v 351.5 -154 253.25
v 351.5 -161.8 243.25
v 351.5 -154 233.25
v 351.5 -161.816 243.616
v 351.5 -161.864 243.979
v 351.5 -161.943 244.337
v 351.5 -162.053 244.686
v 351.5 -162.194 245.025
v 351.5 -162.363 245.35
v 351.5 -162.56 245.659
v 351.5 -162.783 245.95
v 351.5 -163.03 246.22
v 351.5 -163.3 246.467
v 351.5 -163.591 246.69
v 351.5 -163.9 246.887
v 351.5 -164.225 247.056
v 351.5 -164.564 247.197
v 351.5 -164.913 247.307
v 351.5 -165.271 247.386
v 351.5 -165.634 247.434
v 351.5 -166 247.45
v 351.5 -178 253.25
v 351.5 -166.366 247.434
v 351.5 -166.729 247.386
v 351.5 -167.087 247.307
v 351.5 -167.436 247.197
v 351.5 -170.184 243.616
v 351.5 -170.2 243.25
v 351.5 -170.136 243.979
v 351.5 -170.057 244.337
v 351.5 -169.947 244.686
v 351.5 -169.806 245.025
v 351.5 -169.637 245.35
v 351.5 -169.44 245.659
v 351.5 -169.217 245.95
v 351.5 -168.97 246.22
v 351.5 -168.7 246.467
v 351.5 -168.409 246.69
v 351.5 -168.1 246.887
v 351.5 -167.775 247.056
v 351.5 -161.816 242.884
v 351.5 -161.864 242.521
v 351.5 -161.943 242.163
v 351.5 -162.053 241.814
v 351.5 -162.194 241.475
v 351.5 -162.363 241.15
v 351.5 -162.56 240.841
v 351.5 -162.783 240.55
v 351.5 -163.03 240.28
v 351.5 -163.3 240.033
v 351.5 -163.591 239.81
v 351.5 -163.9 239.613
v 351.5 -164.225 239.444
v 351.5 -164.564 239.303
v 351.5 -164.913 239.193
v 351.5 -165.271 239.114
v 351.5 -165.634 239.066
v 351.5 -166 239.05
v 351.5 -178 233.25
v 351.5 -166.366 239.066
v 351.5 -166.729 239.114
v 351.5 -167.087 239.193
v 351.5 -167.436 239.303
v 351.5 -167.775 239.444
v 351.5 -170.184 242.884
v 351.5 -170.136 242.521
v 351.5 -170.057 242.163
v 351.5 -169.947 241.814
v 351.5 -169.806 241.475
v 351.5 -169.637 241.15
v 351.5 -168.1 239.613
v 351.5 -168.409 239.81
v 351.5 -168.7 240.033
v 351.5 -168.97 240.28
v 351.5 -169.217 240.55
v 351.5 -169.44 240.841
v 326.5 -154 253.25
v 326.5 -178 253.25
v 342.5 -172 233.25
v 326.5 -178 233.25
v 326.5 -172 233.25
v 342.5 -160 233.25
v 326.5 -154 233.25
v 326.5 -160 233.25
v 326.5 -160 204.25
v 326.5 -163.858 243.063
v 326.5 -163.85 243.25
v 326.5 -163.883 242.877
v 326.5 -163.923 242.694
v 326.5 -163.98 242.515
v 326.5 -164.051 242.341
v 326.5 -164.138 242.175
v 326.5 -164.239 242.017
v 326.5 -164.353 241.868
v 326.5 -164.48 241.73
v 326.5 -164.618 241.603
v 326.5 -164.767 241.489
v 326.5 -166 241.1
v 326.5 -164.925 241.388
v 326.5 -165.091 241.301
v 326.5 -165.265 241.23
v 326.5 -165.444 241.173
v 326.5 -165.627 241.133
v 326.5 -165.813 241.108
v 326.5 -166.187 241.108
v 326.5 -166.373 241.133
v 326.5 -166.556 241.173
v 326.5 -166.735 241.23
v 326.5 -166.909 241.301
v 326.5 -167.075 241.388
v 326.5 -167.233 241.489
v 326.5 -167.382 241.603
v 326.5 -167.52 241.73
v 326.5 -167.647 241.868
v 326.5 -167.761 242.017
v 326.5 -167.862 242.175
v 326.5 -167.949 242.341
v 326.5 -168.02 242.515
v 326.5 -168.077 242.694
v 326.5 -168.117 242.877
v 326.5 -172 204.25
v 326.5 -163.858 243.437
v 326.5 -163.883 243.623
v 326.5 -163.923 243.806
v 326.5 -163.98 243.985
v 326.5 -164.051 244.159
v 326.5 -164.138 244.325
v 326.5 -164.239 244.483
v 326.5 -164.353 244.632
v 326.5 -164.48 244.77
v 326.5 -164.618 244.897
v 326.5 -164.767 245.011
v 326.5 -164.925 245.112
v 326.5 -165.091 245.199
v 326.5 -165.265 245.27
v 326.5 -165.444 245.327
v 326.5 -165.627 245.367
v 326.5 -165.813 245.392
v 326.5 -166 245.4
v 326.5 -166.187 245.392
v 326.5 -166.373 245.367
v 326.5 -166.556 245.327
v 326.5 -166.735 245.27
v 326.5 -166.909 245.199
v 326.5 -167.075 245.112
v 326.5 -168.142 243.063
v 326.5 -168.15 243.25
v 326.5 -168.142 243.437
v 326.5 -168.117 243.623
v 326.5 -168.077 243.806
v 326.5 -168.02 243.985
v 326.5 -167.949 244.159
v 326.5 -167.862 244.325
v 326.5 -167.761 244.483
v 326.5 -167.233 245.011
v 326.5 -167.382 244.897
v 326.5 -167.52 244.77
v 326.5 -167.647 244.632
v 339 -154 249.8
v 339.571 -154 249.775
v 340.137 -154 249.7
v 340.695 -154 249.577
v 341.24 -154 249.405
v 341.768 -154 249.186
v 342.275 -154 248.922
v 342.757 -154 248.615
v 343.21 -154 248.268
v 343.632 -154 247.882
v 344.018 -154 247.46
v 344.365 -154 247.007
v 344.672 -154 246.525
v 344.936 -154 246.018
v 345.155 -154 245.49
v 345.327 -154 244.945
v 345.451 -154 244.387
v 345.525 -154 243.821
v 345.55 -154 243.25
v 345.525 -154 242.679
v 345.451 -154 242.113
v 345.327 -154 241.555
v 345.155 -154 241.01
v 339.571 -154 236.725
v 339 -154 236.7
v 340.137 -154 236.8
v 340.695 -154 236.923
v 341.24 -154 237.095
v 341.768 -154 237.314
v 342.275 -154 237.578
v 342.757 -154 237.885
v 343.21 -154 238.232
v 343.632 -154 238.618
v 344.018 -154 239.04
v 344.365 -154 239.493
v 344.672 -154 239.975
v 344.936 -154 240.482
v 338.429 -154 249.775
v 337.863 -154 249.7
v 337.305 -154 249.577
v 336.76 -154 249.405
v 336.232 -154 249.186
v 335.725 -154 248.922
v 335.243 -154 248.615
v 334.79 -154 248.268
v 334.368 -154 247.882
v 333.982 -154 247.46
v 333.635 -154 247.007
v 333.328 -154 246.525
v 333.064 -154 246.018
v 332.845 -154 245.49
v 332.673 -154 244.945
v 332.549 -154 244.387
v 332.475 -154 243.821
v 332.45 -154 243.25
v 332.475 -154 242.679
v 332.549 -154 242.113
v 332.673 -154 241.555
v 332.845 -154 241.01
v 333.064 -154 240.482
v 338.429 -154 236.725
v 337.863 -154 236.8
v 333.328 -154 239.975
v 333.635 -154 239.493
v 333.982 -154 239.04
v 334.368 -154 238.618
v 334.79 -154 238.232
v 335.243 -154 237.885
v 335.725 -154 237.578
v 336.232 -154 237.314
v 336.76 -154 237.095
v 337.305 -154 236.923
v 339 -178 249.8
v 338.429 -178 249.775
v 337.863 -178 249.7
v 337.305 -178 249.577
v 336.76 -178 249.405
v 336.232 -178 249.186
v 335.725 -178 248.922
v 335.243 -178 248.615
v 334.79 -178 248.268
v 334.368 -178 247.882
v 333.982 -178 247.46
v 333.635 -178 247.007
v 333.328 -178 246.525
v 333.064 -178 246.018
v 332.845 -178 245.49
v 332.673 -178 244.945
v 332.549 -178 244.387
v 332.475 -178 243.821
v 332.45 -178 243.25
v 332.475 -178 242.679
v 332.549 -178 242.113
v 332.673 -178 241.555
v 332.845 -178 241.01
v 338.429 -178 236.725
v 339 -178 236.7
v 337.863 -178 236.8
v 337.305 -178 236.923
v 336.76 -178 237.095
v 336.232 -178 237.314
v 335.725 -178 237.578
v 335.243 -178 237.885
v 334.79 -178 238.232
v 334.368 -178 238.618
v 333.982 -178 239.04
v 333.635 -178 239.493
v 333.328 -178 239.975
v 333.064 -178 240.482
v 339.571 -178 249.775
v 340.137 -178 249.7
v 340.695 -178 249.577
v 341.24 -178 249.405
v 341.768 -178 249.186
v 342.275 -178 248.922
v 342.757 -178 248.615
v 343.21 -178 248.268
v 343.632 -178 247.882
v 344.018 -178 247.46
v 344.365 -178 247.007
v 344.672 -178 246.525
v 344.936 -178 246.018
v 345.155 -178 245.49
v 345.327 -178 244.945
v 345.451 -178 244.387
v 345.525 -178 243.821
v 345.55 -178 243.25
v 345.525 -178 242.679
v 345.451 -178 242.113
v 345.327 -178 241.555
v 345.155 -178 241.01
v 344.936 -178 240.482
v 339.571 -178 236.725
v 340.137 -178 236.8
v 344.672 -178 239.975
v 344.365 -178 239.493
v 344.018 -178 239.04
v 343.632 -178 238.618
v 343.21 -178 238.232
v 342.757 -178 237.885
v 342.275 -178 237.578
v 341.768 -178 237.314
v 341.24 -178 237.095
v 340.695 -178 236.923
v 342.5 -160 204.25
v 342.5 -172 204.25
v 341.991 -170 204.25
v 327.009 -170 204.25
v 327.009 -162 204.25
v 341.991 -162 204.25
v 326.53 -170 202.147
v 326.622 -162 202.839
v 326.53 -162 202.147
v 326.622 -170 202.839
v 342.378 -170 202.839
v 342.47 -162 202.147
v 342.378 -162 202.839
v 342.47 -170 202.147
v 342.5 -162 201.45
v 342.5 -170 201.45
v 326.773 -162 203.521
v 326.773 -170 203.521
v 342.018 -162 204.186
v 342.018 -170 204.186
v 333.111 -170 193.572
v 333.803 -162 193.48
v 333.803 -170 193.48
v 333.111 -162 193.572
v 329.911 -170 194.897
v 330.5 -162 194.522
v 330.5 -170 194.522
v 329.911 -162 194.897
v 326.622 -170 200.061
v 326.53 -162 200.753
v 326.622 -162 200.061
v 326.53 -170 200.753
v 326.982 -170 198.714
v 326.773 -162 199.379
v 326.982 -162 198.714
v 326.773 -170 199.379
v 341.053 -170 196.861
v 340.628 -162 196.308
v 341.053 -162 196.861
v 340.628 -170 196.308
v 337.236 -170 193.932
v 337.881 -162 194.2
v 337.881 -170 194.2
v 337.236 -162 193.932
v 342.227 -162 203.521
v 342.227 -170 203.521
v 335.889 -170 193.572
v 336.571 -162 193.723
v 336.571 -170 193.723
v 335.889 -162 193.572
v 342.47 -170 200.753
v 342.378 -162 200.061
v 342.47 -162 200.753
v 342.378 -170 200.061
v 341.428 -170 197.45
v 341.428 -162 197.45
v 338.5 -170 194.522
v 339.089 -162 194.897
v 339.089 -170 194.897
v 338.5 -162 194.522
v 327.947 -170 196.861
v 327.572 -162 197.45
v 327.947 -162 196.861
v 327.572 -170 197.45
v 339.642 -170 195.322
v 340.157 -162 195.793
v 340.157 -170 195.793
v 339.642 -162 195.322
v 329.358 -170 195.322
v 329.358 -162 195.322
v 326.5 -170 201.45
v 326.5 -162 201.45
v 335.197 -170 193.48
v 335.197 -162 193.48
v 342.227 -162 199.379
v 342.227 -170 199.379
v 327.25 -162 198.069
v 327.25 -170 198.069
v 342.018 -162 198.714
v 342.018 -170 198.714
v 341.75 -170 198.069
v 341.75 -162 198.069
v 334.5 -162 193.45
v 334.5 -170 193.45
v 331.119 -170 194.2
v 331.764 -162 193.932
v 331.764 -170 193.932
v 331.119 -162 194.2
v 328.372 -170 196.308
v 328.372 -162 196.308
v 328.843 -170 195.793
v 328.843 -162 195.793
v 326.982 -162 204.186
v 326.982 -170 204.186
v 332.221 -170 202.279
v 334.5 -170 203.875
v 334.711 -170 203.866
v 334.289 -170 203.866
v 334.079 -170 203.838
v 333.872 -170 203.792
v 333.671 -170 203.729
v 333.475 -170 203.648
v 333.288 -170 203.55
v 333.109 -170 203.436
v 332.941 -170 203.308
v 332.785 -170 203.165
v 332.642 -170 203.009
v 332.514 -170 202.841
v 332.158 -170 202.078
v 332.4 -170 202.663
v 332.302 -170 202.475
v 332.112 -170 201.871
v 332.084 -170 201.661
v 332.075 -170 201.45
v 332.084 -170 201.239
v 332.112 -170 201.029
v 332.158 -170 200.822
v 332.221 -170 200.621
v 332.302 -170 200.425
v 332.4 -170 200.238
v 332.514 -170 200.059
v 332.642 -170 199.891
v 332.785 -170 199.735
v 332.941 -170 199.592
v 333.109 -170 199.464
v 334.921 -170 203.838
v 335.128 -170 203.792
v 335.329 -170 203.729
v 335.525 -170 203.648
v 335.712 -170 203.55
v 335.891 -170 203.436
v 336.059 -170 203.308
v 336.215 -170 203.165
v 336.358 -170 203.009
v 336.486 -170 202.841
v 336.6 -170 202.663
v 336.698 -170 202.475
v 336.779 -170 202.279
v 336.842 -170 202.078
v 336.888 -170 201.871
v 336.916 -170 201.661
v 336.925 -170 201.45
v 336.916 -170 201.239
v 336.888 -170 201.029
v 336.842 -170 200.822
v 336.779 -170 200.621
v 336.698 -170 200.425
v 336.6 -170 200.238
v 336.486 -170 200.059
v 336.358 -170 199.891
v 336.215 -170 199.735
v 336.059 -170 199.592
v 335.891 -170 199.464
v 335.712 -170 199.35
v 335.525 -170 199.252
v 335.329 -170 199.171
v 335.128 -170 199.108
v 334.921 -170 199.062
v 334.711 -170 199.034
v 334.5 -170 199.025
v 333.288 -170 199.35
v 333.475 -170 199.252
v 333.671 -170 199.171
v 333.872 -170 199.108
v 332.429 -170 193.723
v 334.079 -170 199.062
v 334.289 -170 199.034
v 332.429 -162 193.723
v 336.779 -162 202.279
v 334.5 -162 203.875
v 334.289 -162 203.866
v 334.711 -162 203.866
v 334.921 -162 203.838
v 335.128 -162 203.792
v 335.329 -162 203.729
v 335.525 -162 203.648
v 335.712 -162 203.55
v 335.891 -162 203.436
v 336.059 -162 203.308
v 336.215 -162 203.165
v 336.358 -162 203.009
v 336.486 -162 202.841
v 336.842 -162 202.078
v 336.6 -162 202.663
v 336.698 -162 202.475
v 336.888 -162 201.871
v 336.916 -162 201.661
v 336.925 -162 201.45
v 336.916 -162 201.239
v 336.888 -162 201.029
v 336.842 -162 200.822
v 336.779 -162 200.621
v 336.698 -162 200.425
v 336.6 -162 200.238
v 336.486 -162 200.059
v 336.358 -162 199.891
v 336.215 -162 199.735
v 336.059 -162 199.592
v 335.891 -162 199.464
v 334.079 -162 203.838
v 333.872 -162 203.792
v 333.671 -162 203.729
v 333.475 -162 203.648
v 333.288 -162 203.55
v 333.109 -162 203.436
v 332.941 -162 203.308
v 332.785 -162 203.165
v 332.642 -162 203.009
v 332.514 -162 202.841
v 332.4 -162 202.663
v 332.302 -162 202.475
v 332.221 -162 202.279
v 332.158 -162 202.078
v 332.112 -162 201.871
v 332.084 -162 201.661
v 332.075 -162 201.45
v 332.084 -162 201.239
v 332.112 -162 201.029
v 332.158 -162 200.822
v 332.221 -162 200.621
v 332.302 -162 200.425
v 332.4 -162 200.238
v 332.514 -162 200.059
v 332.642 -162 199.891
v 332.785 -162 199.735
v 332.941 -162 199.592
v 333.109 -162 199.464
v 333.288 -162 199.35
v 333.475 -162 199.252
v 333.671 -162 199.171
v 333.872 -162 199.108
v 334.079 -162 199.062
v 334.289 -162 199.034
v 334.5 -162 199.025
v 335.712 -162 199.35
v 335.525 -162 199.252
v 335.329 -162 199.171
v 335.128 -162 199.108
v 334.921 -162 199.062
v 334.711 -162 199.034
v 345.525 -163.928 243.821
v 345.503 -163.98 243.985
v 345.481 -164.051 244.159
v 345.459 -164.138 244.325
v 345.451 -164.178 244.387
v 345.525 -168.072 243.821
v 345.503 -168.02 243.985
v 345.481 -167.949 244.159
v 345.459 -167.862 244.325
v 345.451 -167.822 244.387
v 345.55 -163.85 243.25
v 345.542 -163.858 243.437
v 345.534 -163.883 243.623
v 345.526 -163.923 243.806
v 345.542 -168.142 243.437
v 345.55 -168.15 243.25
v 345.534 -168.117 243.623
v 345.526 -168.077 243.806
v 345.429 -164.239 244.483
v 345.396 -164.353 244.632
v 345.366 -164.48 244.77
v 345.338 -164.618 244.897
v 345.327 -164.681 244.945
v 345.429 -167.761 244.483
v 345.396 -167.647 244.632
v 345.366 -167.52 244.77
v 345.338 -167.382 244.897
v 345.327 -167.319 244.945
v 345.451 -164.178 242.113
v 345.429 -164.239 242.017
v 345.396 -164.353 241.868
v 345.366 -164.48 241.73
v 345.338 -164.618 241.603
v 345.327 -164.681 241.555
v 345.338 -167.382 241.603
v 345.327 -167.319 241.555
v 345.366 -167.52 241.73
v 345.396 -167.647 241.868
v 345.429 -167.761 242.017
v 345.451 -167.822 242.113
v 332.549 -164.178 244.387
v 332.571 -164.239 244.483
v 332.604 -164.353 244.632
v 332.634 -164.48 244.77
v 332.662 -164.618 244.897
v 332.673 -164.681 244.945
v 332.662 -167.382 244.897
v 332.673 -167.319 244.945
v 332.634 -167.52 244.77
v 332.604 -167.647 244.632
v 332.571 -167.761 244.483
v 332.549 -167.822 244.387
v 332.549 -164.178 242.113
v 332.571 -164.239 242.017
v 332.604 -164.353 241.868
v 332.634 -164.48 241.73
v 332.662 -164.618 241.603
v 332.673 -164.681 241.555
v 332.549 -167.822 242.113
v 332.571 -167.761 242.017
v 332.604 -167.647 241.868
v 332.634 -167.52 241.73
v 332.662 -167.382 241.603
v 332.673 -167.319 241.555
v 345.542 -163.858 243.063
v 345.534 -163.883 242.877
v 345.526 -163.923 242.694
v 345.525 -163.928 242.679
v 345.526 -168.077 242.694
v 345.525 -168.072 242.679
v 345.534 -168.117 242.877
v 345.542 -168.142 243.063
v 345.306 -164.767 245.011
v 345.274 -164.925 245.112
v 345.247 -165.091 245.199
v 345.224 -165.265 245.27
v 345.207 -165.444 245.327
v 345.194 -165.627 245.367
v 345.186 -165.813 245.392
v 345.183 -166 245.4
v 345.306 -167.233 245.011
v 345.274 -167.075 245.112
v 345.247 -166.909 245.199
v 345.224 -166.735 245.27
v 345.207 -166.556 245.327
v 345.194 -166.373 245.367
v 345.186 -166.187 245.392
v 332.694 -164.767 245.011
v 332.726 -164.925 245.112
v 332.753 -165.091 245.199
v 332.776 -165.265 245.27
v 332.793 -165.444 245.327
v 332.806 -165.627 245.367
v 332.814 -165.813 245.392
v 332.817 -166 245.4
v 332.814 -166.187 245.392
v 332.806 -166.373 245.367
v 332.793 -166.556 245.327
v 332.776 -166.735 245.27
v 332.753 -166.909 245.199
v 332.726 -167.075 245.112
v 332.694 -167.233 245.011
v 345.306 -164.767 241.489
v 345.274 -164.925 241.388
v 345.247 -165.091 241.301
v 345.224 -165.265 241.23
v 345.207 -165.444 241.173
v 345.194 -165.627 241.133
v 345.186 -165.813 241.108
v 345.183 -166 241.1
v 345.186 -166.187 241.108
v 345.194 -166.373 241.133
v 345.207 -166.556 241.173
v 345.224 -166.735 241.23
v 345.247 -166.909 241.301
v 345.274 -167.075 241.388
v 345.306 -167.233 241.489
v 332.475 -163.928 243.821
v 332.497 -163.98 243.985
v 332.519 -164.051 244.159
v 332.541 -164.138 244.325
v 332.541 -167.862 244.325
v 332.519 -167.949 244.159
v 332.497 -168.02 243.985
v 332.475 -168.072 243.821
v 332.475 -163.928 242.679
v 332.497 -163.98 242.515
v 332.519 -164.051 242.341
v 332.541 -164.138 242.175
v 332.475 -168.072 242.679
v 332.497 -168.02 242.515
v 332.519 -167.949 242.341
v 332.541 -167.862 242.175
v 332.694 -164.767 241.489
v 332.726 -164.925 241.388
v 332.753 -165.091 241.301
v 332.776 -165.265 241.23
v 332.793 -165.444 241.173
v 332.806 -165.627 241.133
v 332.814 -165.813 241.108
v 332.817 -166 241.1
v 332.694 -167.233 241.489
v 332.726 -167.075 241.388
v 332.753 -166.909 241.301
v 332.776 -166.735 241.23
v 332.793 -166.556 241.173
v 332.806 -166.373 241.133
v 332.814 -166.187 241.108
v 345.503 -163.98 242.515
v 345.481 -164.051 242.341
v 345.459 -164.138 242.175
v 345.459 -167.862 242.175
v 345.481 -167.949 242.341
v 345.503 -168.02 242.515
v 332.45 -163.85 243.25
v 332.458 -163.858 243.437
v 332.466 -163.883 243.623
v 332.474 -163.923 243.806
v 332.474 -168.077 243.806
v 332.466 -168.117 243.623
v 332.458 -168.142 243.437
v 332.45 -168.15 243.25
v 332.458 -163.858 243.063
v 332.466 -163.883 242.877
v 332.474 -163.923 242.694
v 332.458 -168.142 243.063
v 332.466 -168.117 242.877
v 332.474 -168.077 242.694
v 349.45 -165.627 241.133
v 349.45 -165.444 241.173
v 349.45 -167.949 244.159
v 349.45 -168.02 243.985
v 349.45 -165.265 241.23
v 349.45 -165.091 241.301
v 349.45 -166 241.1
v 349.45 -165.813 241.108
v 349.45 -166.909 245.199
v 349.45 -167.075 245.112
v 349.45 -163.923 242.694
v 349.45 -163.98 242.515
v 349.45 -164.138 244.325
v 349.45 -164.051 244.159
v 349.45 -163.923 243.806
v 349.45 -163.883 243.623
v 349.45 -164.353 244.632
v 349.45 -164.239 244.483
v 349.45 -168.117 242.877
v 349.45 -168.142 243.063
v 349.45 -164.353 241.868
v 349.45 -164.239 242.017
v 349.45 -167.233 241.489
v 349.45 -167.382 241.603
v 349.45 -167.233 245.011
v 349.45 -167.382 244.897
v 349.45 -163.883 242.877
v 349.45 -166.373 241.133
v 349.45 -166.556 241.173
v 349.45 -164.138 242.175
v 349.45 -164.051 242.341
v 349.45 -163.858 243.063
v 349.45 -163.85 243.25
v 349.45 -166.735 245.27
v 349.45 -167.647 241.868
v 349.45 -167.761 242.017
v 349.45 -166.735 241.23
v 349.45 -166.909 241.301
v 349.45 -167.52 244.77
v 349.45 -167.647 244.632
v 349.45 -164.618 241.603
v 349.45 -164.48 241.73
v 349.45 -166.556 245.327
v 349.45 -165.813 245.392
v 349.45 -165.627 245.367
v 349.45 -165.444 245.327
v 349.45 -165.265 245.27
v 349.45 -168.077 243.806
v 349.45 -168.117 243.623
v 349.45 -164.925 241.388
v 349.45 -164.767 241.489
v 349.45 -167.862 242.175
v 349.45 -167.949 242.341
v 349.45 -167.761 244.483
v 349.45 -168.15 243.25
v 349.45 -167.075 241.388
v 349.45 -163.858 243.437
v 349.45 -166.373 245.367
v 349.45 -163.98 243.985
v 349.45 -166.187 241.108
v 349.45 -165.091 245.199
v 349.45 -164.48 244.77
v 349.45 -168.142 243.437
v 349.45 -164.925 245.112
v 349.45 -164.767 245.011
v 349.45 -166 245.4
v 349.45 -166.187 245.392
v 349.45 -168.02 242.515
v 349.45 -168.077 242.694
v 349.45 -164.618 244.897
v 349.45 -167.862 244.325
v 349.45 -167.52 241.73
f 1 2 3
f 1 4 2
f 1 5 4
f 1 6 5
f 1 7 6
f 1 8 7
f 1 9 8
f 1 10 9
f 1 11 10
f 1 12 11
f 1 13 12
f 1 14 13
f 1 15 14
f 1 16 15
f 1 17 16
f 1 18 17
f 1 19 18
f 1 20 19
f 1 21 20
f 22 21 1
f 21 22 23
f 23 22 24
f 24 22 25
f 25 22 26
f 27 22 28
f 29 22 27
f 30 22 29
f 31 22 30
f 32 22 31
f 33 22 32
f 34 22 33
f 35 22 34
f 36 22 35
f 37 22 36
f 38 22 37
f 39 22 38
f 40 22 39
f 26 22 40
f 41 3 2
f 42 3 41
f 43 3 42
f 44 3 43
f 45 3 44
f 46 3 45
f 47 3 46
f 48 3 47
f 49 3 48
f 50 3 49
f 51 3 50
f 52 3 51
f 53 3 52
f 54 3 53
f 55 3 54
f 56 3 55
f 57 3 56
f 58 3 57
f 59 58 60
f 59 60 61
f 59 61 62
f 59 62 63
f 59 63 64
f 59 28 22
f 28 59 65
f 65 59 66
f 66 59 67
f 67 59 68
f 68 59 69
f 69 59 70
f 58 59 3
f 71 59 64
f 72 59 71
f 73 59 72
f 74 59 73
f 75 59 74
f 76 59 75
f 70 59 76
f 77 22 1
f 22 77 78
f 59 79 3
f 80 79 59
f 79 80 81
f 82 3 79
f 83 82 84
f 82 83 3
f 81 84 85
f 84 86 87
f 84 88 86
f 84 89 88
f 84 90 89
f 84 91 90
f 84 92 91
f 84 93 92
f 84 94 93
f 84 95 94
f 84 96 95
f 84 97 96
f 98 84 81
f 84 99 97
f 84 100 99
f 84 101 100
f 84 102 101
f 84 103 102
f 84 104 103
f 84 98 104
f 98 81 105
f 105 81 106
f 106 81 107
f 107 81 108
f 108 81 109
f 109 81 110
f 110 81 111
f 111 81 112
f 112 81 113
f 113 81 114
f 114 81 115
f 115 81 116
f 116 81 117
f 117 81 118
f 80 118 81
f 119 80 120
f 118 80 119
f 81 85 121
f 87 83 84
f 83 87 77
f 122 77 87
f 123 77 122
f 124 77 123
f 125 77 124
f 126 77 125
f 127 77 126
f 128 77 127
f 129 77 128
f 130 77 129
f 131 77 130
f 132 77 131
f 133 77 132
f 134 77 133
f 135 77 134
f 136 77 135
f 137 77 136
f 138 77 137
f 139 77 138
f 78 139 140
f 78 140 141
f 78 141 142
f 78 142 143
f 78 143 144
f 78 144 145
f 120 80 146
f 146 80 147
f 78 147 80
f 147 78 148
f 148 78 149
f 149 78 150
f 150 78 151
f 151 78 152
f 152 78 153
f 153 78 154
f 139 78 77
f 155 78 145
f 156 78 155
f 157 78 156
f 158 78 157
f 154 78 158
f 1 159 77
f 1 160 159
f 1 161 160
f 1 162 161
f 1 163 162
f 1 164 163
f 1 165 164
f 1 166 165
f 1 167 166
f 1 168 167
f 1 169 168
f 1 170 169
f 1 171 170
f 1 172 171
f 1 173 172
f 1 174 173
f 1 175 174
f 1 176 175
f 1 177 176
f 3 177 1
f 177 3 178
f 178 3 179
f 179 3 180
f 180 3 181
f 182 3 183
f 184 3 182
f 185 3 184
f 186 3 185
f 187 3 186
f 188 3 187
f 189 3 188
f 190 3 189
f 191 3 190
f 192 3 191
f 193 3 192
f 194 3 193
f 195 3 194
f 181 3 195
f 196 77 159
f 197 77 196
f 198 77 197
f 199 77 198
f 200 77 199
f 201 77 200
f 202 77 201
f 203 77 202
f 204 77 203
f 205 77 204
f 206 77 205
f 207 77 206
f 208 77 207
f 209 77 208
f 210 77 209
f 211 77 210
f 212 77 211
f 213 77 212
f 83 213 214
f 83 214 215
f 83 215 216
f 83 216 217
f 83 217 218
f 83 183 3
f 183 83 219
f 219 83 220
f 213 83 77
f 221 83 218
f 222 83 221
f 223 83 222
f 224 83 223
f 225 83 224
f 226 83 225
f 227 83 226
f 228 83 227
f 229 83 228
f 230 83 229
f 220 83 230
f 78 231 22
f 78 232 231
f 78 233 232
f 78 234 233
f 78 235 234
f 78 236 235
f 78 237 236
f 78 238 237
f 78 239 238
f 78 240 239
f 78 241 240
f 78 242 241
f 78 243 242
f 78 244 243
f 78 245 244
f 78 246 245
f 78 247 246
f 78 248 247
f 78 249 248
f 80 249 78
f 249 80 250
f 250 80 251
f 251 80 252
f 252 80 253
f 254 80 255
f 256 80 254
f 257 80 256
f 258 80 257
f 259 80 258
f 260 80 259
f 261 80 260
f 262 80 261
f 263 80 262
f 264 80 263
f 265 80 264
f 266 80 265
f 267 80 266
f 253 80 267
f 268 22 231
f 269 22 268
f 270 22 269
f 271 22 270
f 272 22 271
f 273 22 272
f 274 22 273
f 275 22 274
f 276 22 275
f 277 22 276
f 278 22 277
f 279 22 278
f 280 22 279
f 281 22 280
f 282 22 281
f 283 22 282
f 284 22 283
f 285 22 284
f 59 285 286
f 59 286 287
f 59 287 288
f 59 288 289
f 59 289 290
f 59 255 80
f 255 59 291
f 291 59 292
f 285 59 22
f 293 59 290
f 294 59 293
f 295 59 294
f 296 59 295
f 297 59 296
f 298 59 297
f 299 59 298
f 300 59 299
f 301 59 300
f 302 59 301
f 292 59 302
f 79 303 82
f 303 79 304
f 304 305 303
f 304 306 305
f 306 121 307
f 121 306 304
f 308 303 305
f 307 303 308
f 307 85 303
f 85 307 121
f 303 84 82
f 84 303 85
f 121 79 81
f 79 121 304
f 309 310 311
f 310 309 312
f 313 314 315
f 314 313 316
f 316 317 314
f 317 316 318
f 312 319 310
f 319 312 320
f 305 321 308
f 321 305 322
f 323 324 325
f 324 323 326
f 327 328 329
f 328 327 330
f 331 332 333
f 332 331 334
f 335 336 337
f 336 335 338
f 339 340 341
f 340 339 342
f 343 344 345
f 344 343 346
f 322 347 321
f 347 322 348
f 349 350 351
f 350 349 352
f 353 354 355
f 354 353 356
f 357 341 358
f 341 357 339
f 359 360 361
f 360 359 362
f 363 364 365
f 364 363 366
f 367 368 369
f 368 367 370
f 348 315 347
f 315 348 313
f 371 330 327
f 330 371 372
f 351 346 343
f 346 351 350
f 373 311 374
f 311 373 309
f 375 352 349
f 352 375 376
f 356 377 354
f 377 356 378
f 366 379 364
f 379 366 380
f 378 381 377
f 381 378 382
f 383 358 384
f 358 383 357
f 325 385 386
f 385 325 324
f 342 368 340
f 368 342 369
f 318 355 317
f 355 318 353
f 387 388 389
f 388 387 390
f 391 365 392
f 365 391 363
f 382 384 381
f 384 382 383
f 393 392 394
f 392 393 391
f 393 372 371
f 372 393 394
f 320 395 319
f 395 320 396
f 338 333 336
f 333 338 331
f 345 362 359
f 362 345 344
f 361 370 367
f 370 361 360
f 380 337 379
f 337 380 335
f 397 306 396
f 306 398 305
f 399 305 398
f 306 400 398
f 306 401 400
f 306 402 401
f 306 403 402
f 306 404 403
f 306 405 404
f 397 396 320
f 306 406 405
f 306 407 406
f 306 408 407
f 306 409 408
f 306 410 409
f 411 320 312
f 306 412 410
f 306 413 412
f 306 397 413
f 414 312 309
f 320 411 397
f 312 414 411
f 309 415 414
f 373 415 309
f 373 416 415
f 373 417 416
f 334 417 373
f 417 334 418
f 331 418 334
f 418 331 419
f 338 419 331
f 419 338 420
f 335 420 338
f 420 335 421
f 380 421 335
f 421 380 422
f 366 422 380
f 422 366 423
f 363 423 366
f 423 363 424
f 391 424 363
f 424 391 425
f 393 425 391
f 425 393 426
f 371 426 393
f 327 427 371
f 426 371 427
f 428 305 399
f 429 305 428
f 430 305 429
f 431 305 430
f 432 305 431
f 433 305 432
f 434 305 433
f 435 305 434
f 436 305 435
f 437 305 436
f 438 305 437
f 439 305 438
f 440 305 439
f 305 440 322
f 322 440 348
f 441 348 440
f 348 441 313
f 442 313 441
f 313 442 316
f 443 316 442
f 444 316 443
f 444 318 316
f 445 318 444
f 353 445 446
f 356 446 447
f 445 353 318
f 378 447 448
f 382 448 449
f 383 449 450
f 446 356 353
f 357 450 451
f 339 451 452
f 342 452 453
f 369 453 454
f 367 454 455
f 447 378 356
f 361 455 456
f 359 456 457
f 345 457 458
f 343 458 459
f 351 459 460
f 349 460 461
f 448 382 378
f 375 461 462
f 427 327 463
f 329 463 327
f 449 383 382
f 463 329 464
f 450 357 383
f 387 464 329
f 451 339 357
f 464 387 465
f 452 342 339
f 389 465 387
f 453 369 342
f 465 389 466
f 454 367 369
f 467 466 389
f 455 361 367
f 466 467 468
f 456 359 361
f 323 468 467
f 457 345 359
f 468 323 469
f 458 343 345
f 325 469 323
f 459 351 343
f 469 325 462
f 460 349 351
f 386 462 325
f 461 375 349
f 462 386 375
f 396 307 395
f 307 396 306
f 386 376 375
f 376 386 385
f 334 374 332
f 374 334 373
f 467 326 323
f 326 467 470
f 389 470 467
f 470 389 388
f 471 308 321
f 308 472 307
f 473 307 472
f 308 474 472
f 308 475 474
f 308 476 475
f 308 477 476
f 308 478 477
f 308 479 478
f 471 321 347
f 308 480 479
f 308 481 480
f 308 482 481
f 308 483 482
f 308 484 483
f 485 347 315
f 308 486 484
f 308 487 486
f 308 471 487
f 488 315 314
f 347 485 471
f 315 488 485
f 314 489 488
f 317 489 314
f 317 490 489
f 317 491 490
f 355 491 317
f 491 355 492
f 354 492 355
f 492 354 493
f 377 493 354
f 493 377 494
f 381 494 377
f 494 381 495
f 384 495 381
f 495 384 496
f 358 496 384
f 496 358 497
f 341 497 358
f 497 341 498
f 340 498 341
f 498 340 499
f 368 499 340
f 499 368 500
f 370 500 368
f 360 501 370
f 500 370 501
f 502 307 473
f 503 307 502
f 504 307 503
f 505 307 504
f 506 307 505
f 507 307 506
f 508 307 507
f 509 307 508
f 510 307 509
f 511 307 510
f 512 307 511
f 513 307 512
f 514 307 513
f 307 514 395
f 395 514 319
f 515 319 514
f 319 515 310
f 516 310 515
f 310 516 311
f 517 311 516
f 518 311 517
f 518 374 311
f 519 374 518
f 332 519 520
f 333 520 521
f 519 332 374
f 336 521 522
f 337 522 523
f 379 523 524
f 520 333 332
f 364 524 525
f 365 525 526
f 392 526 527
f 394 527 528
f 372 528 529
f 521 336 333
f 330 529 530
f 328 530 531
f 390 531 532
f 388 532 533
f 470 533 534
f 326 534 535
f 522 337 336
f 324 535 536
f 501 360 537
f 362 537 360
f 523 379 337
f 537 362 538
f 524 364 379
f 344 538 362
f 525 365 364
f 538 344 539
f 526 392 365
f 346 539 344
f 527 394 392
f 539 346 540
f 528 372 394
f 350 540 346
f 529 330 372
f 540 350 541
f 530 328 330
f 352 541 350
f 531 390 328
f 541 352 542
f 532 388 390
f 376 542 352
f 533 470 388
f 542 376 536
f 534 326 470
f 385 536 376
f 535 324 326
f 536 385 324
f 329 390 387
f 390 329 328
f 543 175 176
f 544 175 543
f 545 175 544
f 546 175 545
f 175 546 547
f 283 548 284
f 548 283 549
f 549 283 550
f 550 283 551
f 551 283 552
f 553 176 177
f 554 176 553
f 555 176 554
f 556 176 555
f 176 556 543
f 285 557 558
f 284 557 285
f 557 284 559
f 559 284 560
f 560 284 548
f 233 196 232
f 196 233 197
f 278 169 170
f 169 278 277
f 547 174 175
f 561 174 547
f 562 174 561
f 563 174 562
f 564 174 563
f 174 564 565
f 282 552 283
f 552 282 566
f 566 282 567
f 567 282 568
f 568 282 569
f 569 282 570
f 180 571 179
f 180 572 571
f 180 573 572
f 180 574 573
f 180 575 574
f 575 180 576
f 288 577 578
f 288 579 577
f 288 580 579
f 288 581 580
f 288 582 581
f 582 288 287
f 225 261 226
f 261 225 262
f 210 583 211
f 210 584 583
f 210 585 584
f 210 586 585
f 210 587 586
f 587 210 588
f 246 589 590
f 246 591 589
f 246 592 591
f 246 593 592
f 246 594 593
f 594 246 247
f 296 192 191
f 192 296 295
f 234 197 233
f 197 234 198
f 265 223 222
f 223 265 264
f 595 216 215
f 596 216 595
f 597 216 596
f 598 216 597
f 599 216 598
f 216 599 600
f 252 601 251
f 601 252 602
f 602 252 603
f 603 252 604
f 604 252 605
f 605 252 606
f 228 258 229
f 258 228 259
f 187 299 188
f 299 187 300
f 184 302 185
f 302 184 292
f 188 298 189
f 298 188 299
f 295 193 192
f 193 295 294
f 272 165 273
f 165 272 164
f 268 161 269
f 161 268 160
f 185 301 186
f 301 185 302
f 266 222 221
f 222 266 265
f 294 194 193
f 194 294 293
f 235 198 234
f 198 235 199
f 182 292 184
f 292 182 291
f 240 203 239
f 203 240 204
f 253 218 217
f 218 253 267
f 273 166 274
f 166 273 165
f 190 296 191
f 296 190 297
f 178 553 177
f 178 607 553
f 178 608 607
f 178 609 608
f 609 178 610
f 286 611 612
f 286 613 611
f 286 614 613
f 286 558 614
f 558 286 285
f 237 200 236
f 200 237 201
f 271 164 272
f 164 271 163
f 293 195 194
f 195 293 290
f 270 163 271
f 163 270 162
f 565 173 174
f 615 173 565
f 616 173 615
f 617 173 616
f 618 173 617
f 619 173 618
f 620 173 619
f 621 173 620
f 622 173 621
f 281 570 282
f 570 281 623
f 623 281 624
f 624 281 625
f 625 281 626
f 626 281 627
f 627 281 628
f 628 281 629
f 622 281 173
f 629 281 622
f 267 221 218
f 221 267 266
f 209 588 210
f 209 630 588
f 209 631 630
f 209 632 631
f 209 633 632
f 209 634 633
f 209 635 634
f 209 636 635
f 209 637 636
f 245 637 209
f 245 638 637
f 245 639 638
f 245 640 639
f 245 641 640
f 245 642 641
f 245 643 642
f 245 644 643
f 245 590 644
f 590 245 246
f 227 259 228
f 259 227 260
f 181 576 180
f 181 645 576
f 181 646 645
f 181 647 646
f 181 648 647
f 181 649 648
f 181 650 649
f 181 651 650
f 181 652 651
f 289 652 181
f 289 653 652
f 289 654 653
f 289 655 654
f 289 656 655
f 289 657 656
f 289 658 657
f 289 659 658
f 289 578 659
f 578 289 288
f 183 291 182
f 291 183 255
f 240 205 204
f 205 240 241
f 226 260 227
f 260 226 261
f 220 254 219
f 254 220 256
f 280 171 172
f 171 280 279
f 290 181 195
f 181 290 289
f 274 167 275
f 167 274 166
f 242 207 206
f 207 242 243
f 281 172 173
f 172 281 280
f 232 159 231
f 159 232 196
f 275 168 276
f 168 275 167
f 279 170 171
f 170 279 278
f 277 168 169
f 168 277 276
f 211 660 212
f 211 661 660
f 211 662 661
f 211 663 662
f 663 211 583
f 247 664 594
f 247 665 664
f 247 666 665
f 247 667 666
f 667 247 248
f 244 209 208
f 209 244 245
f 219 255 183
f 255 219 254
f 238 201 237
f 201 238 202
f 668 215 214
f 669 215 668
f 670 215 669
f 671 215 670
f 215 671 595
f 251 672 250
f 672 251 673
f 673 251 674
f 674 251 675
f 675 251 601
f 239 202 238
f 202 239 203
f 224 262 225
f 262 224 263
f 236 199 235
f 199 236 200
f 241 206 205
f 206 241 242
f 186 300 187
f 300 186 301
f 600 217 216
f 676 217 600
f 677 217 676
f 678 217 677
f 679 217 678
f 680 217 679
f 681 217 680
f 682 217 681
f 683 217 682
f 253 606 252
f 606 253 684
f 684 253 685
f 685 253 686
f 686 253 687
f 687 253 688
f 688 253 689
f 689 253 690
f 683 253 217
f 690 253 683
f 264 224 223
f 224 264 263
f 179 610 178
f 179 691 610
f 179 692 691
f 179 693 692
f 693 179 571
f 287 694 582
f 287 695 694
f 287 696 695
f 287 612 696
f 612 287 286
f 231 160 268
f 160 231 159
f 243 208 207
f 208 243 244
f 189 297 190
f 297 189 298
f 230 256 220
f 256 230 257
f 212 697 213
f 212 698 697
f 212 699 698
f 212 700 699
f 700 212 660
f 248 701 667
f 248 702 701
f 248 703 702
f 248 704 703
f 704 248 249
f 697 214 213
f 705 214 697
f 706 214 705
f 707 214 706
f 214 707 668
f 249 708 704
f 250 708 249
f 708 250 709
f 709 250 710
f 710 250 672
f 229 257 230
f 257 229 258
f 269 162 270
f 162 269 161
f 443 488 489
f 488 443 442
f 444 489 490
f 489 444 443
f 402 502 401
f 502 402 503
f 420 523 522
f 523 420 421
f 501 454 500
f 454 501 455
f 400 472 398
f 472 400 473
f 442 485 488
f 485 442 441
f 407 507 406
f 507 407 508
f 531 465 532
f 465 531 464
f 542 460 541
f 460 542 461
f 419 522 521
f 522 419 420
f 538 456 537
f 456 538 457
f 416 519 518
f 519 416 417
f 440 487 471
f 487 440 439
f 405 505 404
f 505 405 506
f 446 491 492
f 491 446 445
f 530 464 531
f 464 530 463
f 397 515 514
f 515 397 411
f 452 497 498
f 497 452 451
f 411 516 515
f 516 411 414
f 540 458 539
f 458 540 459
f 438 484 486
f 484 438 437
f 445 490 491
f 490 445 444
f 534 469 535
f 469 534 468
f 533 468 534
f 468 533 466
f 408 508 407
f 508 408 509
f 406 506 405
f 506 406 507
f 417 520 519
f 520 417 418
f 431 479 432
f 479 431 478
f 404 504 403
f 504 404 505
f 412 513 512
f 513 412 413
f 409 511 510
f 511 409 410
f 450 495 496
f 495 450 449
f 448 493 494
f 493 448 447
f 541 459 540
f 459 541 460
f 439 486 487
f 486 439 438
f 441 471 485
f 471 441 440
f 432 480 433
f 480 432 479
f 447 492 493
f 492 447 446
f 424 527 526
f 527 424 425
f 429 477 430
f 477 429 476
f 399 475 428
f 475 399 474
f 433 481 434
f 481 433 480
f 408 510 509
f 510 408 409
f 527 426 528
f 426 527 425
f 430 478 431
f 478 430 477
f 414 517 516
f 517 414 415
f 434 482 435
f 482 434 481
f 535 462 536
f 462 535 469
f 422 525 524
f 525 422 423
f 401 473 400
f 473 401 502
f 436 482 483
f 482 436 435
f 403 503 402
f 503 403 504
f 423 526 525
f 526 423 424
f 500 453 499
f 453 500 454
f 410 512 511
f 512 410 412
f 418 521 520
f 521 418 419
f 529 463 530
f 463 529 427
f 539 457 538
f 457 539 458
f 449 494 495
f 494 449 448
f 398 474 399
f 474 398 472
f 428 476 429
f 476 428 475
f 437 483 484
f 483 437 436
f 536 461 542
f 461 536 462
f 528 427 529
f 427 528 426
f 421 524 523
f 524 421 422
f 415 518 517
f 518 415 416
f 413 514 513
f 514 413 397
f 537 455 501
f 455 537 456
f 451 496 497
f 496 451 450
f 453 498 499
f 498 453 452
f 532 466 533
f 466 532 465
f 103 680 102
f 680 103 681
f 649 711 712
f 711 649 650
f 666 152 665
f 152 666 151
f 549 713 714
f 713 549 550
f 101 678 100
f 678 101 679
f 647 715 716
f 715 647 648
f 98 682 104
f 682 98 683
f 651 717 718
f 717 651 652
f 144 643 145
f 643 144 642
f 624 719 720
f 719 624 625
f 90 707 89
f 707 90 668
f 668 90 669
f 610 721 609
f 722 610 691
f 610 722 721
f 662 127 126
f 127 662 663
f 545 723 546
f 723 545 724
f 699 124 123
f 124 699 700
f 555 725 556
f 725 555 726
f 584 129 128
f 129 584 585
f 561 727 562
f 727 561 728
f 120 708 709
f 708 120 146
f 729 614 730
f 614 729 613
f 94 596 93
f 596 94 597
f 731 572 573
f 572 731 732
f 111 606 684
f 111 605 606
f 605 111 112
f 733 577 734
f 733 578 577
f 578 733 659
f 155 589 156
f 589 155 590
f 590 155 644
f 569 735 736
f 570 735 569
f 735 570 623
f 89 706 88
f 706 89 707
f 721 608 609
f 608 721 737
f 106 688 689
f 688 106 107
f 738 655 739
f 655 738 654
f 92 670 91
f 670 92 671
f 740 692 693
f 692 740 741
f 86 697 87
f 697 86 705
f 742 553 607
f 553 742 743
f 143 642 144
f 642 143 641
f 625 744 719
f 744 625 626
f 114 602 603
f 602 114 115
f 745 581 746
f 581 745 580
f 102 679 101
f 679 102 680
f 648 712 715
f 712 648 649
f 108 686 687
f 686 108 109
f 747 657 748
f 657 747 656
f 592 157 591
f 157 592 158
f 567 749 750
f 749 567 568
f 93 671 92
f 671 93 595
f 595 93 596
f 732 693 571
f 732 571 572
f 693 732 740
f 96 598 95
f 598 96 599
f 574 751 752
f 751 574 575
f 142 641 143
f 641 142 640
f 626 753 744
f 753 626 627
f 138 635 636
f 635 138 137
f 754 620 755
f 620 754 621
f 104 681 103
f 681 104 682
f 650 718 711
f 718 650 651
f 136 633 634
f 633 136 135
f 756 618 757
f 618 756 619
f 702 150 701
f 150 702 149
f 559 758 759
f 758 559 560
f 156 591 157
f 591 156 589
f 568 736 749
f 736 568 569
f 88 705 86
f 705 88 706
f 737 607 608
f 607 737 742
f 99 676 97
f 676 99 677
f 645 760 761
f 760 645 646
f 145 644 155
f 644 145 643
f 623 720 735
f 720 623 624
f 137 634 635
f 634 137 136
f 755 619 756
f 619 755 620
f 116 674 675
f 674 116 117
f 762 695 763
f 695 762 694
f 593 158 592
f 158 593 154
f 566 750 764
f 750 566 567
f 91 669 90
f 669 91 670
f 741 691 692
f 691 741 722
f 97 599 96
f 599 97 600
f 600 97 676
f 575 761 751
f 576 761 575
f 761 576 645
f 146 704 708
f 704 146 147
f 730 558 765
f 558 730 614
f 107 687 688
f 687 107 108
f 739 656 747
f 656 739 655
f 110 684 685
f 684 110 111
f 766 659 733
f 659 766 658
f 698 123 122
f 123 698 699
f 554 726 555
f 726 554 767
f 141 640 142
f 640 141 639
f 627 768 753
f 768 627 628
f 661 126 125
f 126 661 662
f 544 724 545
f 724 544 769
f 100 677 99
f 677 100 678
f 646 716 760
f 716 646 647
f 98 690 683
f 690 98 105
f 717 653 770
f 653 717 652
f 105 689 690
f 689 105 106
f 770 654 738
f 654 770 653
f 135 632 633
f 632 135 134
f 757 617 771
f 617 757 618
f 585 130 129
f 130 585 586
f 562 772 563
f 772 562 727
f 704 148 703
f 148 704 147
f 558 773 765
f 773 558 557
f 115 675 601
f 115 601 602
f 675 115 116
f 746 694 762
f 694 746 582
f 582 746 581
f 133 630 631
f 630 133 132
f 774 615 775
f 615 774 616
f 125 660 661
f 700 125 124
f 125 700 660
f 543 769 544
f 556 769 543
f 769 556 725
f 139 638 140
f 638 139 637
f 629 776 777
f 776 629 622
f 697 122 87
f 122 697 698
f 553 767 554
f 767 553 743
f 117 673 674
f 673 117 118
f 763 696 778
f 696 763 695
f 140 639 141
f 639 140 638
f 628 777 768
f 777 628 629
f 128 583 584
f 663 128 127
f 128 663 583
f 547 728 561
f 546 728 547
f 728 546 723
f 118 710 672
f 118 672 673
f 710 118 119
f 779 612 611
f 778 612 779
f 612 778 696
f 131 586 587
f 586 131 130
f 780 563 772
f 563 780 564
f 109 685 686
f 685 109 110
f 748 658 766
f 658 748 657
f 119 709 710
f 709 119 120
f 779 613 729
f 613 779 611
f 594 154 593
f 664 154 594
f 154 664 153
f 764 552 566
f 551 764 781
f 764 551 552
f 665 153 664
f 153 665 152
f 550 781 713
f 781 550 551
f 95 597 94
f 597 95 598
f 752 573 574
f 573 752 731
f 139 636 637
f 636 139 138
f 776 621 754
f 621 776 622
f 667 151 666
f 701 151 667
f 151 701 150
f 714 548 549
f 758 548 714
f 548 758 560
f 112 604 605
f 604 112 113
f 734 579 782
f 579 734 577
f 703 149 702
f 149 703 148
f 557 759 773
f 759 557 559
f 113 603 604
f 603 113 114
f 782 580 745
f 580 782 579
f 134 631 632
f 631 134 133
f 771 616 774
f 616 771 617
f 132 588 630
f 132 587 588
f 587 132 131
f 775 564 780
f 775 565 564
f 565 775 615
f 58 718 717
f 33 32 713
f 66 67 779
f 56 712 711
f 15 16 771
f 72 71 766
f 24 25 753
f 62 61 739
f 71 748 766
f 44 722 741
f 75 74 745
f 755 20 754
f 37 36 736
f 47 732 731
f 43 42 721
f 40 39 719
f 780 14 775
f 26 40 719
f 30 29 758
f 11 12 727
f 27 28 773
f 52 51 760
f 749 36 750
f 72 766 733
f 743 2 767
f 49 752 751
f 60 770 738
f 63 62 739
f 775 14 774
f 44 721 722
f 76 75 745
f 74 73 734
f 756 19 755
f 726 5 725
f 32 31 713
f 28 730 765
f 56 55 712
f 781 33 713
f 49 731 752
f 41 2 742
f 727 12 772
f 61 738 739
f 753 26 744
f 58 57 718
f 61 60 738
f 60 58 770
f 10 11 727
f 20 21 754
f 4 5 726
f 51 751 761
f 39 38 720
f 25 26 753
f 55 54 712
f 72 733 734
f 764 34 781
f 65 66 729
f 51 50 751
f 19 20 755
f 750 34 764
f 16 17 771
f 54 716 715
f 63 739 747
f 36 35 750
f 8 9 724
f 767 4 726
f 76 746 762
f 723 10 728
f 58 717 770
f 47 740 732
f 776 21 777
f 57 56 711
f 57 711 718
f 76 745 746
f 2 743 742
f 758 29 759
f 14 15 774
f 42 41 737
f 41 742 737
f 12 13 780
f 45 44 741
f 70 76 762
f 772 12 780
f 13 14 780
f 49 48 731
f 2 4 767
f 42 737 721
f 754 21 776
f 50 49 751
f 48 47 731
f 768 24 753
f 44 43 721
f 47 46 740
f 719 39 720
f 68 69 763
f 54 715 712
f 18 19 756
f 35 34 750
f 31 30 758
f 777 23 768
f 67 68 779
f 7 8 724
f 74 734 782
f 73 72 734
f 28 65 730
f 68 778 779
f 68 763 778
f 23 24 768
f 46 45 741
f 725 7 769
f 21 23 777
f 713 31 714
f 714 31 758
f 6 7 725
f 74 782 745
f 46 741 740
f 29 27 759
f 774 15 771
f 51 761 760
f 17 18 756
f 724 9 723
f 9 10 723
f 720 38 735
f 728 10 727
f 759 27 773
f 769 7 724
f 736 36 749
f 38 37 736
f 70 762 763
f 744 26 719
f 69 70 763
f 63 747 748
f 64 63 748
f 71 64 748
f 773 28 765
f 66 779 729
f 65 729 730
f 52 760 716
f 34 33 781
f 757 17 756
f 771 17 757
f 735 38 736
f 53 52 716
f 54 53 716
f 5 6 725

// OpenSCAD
// Load-path revision11; millimetres above bench at initial head pose.
$fn=72;
PART="outboard_hanger";
ROD_Y=115;
module bore_y(d,h){rotate([90,0,0])cylinder(d=d,h=h,center=true);}
module outboard_hanger(){difference(){union(){
 translate([339,-166,243.25])cube([25,24,20],center=true);
 translate([334.5,-166,221.25])cube([16,12,34],center=true);
 translate([334.5,-166,201.45])bore_y(16,8);
 }
 translate([339,-166,243.25])bore_y(13.1,28);
 translate([334.5,-166,201.45])bore_y(4.85,16);
 translate([339,-166,243.25])rotate([0,90,0])cylinder(d=4.3,h=40,center=true);
 translate([349.45,-166,243.25])rotate([0,90,0])cylinder(d1=4.3,d2=8.4,h=2.05);
}}
module upper_guide_clamp(y=115){difference(){union(){
 translate([351,y,282.5])cube([13,13,10],center=true);
 translate([358.5,y,272])cube([8,8,14],center=true);
 translate([377.5,y,270])cube([43,8,10],center=true);
 for(x=[380,394])translate([x,y,270])cylinder(d=10,h=10,center=true);
 }
 translate([351,y,277.5])cylinder(d=8.1,h=30,center=true);
 translate([345.5,y,282.5])rotate([0,90,0])cylinder(d=2.5,h=10,center=true);
 for(x=[380,394]){translate([x,y,270])cylinder(d=3.3,h=30,center=true);translate([x,y,273.35])cylinder(d1=3.3,d2=6.6,h=1.65);}
}}
module steel_spine(){difference(){translate([340.3,-45,201.45])cube([6.35,211,6.35],center=true);for(y=[-140,55])translate([340.3,y,201.45])cylinder(d=3.3,h=10,center=true);}}
if(PART=="outboard_hanger")outboard_hanger();
if(PART=="upper_guide_clamp")upper_guide_clamp(ROD_Y);
if(PART=="steel_spine")steel_spine();
